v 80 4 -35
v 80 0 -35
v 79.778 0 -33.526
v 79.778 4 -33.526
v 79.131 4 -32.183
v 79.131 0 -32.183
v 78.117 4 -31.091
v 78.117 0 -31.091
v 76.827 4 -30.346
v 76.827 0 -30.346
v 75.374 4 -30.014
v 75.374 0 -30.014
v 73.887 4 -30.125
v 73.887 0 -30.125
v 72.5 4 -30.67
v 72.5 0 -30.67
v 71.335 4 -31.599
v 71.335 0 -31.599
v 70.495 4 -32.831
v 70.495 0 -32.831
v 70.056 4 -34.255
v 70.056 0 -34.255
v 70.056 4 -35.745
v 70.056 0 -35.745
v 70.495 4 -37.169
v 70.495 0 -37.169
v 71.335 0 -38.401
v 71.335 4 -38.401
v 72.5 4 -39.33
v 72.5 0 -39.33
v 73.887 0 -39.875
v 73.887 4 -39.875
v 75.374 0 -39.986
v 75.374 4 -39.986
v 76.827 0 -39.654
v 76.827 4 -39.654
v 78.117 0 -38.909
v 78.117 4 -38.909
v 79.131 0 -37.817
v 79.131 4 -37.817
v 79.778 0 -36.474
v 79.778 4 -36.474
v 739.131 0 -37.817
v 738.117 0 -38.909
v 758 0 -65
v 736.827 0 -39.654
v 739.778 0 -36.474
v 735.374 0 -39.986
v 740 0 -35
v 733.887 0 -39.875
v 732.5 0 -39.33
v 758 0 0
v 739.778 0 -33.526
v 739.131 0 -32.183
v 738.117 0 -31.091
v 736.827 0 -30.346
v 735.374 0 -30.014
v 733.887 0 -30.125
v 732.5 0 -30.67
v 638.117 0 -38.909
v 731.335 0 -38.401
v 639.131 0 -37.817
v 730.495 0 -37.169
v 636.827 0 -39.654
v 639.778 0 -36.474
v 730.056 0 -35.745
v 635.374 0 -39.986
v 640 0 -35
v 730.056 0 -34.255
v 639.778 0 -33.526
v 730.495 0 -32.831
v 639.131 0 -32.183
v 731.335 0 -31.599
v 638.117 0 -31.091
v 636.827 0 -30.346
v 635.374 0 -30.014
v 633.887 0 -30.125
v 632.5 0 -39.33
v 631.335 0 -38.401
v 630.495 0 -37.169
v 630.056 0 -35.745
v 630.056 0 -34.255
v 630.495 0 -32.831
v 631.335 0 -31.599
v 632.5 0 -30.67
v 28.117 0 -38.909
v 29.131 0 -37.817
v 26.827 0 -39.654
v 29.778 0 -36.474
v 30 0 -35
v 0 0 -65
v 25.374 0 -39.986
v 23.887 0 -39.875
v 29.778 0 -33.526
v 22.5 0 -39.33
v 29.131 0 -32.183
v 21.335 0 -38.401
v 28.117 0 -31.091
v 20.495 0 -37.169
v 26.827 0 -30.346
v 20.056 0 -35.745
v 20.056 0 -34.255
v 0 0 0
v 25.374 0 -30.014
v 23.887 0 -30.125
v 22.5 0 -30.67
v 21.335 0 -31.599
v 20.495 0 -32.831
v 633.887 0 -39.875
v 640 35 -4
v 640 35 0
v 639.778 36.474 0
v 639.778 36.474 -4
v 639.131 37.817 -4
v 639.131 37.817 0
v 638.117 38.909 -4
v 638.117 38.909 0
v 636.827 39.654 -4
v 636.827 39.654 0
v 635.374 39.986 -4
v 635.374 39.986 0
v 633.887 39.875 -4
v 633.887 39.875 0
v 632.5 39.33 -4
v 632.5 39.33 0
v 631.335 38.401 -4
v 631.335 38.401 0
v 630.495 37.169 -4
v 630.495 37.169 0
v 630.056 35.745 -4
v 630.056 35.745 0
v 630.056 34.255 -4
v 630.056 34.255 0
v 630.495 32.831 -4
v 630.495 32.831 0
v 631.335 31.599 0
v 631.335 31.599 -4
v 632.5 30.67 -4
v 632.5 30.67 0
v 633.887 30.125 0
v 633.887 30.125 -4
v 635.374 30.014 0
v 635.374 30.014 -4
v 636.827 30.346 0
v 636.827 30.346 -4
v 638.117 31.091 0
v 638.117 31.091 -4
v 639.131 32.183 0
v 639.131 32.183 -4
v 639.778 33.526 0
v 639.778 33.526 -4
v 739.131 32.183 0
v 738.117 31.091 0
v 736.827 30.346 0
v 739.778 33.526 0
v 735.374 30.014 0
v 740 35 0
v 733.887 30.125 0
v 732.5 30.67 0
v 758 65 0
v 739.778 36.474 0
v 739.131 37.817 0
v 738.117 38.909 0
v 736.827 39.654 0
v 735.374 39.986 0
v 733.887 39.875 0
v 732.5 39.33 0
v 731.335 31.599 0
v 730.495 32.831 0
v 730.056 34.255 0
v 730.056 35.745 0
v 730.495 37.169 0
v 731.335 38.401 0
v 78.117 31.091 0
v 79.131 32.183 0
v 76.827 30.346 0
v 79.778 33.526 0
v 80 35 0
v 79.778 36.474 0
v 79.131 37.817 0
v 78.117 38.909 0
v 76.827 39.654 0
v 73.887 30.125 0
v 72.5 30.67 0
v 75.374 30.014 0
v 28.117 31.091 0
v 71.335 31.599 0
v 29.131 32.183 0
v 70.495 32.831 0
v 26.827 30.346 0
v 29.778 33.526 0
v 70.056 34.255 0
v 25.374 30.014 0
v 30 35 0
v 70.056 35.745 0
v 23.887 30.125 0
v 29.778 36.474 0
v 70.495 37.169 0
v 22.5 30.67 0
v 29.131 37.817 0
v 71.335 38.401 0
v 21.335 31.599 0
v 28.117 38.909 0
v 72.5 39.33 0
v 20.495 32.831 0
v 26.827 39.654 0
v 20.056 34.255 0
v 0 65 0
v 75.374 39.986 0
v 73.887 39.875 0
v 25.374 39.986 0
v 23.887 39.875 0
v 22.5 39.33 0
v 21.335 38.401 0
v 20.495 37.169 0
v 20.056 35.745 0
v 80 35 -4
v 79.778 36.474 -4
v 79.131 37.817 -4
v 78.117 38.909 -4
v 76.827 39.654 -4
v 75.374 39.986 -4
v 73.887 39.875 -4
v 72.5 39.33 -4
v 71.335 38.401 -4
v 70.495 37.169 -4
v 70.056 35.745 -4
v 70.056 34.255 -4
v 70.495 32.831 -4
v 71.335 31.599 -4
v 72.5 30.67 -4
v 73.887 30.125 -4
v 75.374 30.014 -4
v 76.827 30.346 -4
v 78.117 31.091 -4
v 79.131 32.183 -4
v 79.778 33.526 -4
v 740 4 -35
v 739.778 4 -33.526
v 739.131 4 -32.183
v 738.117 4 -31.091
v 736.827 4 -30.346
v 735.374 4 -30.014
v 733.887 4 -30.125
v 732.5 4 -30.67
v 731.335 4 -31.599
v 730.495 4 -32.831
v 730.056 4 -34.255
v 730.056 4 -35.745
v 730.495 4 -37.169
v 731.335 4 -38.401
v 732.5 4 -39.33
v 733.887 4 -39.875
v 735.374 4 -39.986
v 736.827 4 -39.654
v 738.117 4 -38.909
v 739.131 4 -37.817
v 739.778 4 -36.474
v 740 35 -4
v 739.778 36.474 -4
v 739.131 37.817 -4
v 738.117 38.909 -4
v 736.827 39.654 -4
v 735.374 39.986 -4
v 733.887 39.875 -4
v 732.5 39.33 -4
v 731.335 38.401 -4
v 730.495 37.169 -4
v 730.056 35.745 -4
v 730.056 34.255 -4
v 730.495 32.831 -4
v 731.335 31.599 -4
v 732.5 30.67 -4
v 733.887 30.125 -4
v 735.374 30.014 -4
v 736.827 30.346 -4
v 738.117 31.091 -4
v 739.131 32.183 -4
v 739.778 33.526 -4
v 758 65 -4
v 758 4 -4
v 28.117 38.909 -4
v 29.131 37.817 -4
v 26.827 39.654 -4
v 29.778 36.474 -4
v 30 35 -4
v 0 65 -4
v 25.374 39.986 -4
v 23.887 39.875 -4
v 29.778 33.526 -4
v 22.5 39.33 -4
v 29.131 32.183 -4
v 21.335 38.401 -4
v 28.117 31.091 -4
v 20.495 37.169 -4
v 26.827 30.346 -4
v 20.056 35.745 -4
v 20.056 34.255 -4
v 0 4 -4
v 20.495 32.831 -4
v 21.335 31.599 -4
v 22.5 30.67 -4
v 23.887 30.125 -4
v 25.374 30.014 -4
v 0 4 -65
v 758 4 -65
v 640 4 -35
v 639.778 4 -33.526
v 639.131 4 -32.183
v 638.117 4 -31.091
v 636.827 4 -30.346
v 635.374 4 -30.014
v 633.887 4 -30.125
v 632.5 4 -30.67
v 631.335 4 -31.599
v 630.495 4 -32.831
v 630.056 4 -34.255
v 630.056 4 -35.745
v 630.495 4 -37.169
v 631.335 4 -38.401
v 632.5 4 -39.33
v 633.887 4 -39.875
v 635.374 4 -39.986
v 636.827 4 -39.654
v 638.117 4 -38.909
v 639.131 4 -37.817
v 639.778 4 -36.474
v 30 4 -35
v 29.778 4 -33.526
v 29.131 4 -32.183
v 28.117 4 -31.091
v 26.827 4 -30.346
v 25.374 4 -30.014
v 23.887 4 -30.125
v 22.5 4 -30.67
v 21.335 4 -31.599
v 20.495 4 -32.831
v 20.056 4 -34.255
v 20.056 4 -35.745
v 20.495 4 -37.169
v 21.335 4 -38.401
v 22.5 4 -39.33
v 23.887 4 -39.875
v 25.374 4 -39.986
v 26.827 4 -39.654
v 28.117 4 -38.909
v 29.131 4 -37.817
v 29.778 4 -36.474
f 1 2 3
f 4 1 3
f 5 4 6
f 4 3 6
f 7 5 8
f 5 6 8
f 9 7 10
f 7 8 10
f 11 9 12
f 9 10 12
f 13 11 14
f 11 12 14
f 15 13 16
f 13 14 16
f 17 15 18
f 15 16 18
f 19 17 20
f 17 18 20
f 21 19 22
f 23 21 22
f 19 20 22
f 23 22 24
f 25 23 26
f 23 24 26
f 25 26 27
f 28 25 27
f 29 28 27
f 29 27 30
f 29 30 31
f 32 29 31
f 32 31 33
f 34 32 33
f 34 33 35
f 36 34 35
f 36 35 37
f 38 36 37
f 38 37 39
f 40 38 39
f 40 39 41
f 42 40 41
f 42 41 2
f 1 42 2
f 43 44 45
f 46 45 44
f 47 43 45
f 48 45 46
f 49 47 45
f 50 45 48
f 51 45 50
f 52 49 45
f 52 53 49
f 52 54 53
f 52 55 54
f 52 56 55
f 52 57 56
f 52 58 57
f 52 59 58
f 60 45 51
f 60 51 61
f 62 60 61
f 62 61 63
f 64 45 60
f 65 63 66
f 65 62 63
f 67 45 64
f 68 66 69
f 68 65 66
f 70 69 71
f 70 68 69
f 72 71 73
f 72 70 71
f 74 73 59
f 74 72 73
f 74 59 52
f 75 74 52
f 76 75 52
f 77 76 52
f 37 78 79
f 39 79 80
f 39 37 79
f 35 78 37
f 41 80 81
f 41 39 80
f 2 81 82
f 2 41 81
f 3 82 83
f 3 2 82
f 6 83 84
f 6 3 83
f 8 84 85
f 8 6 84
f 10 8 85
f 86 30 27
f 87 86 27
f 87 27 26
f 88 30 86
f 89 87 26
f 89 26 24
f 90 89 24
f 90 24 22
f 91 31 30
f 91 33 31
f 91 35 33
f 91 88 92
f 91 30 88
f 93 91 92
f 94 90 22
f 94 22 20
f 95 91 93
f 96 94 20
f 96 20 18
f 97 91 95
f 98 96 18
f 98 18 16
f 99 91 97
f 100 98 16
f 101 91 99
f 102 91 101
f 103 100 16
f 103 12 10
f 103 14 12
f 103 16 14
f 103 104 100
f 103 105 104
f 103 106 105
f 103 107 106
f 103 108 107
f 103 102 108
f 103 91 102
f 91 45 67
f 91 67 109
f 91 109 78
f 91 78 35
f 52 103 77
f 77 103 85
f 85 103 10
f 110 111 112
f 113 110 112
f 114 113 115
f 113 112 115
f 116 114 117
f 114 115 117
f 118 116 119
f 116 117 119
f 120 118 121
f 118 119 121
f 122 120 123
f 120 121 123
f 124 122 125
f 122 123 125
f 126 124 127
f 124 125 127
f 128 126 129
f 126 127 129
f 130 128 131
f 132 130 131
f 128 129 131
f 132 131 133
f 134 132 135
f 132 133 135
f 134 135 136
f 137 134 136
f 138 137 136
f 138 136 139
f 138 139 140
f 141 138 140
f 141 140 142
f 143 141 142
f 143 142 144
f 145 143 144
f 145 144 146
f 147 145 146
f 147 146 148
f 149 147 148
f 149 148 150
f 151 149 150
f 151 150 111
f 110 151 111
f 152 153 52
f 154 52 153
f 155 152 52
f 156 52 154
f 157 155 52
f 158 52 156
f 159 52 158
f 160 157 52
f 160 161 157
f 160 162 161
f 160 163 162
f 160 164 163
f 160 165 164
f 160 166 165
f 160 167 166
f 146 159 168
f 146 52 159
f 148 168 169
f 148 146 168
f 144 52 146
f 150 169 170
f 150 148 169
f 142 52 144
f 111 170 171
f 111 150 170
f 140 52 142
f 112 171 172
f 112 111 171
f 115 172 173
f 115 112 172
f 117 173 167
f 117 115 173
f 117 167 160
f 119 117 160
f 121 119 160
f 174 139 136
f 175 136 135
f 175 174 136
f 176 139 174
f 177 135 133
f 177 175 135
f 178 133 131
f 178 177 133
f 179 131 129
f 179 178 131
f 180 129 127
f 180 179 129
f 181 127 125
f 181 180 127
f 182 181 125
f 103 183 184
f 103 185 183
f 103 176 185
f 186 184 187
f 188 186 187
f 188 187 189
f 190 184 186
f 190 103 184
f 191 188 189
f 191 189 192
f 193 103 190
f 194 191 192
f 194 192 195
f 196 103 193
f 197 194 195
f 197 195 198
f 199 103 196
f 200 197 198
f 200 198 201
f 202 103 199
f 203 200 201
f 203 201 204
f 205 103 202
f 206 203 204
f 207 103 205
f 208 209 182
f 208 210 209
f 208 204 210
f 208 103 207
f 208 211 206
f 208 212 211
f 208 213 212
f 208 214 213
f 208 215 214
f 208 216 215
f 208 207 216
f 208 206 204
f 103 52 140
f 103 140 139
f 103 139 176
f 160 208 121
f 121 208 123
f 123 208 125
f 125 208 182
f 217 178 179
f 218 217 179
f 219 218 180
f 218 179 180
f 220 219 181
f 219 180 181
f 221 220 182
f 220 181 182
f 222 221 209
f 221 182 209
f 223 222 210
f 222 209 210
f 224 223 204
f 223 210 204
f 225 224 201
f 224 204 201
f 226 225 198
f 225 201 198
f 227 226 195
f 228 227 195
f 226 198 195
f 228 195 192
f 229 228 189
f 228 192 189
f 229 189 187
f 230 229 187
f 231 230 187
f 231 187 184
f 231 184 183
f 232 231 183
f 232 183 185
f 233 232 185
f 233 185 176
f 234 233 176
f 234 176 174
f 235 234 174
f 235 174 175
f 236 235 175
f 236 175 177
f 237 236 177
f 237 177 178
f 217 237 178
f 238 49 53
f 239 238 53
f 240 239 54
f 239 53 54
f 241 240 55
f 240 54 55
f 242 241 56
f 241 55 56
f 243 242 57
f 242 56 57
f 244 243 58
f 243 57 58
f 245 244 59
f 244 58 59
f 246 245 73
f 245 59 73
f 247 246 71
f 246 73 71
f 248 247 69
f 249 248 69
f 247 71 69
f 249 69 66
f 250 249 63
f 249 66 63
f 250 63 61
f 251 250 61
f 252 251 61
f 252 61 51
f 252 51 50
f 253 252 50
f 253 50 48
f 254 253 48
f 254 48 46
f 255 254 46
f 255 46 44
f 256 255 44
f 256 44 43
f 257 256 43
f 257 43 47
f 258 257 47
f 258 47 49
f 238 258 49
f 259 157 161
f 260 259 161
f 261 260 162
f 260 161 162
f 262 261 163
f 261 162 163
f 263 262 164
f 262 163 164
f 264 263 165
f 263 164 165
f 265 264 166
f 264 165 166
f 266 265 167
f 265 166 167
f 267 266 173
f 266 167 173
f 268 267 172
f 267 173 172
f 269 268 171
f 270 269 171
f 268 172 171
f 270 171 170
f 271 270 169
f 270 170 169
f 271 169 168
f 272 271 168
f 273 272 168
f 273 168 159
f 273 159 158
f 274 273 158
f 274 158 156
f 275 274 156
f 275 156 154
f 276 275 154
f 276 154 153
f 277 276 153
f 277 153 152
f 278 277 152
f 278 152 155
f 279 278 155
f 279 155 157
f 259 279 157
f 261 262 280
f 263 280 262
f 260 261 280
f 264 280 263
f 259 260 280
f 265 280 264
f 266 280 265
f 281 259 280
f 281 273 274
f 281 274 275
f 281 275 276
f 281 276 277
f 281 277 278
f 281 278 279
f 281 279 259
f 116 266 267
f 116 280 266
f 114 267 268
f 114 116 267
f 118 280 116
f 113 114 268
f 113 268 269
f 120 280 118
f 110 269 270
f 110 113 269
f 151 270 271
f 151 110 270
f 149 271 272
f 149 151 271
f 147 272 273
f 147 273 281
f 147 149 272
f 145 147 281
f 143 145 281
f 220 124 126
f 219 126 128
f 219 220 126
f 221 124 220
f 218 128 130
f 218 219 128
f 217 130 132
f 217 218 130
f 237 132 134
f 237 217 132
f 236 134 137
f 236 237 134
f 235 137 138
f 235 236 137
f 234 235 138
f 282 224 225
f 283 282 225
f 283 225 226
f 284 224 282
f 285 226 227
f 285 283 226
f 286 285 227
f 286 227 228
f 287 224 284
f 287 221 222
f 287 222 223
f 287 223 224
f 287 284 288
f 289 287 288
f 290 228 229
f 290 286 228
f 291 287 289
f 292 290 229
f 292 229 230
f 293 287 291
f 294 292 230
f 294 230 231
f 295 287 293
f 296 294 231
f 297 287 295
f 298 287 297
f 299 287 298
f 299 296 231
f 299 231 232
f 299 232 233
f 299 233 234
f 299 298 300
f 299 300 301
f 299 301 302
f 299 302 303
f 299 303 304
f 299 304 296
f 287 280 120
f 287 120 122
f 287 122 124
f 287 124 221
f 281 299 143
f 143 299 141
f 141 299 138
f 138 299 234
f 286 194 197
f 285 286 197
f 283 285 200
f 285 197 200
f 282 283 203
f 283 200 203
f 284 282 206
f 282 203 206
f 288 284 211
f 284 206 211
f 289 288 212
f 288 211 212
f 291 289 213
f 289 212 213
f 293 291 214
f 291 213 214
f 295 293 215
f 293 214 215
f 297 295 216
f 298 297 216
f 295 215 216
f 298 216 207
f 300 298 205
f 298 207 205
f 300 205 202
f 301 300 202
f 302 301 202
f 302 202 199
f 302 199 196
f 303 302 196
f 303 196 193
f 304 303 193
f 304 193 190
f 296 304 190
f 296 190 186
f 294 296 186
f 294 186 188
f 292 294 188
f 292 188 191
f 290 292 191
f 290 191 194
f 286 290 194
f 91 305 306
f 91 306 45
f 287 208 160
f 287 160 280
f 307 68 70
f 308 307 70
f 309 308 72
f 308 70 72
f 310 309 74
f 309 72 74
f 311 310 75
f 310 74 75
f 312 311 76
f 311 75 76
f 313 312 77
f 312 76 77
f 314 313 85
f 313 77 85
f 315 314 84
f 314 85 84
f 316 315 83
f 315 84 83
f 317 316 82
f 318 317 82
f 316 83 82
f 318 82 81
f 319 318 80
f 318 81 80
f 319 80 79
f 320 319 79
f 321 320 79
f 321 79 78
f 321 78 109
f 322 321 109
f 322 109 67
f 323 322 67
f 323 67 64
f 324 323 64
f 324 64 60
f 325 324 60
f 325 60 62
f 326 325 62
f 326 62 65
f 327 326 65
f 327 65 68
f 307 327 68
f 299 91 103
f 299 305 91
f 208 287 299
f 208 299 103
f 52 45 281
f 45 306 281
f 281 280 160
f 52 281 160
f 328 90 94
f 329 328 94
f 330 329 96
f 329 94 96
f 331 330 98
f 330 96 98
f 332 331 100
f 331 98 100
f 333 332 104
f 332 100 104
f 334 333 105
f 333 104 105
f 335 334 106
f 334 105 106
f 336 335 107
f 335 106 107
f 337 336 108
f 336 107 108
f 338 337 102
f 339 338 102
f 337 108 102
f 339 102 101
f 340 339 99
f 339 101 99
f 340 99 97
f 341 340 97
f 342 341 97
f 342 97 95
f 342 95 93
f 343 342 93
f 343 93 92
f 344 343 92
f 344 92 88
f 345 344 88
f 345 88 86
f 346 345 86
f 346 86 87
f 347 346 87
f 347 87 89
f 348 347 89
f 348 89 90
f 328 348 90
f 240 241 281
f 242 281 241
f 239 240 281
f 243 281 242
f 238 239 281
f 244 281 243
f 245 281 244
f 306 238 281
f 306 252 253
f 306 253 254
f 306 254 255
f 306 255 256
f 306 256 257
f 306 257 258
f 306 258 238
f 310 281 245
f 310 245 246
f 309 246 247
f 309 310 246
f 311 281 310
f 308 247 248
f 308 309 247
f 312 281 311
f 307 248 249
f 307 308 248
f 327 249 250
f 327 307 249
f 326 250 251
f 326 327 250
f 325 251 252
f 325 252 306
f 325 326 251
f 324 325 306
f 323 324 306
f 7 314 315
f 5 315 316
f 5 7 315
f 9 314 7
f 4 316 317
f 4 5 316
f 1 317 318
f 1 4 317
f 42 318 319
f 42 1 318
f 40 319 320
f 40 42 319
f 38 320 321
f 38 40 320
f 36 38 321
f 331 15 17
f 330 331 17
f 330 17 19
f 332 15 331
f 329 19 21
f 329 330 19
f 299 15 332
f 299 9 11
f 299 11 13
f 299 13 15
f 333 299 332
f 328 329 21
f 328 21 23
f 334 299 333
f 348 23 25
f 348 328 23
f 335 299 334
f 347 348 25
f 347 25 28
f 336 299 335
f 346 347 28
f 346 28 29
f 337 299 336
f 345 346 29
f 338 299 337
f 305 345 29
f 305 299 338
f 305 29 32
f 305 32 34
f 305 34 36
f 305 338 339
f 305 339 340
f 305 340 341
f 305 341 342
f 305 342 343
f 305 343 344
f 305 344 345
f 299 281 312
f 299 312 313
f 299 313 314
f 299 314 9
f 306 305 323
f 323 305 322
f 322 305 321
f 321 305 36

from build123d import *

# Parameters (mm, degrees)
EXTRUDE_1_DEPTH     = 758
SKETCH_2_R          = 5
CUT_EXTRUDE_1_DEPTH = 10
SKETCH_3_R          = 5
CUT_EXTRUDE_2_DEPTH = 10


with BuildPart() as part:
    # Эскиз1 → Вытянуть-Тонкостенный1 (new body)
    with BuildSketch(Plane(origin=(0, 0, 0), x_dir=(0, 0, -1), z_dir=(1, 0, 0))):
        Polygon((65, 0), (0, 0), (0, 65), (4, 65), (4, 4), (65, 4), align=None)
    extrude(amount=EXTRUDE_1_DEPTH)

    # Эскиз2 → Вырез-Вытянуть1 (cut)
    with BuildSketch(Plane.XY):
        with Locations((25, 35)):
            Circle(SKETCH_2_R)
        with Locations((75, 35)):
            Circle(SKETCH_2_R)
        with Locations((735, 35)):
            Circle(SKETCH_2_R)
        with Locations((635, 35)):
            Circle(SKETCH_2_R)
    extrude(amount=-CUT_EXTRUDE_1_DEPTH, mode=Mode.SUBTRACT)

    # Эскиз3 → Вырез-Вытянуть2 (cut)
    with BuildSketch(Plane.XZ):
        with Locations((25, -35)):
            Circle(SKETCH_3_R)
        with Locations((75, -35)):
            Circle(SKETCH_3_R)
        with Locations((735, -35)):
            Circle(SKETCH_3_R)
        with Locations((635, -35)):
            Circle(SKETCH_3_R)
    extrude(amount=-CUT_EXTRUDE_2_DEPTH, mode=Mode.SUBTRACT)


solid = part.part
